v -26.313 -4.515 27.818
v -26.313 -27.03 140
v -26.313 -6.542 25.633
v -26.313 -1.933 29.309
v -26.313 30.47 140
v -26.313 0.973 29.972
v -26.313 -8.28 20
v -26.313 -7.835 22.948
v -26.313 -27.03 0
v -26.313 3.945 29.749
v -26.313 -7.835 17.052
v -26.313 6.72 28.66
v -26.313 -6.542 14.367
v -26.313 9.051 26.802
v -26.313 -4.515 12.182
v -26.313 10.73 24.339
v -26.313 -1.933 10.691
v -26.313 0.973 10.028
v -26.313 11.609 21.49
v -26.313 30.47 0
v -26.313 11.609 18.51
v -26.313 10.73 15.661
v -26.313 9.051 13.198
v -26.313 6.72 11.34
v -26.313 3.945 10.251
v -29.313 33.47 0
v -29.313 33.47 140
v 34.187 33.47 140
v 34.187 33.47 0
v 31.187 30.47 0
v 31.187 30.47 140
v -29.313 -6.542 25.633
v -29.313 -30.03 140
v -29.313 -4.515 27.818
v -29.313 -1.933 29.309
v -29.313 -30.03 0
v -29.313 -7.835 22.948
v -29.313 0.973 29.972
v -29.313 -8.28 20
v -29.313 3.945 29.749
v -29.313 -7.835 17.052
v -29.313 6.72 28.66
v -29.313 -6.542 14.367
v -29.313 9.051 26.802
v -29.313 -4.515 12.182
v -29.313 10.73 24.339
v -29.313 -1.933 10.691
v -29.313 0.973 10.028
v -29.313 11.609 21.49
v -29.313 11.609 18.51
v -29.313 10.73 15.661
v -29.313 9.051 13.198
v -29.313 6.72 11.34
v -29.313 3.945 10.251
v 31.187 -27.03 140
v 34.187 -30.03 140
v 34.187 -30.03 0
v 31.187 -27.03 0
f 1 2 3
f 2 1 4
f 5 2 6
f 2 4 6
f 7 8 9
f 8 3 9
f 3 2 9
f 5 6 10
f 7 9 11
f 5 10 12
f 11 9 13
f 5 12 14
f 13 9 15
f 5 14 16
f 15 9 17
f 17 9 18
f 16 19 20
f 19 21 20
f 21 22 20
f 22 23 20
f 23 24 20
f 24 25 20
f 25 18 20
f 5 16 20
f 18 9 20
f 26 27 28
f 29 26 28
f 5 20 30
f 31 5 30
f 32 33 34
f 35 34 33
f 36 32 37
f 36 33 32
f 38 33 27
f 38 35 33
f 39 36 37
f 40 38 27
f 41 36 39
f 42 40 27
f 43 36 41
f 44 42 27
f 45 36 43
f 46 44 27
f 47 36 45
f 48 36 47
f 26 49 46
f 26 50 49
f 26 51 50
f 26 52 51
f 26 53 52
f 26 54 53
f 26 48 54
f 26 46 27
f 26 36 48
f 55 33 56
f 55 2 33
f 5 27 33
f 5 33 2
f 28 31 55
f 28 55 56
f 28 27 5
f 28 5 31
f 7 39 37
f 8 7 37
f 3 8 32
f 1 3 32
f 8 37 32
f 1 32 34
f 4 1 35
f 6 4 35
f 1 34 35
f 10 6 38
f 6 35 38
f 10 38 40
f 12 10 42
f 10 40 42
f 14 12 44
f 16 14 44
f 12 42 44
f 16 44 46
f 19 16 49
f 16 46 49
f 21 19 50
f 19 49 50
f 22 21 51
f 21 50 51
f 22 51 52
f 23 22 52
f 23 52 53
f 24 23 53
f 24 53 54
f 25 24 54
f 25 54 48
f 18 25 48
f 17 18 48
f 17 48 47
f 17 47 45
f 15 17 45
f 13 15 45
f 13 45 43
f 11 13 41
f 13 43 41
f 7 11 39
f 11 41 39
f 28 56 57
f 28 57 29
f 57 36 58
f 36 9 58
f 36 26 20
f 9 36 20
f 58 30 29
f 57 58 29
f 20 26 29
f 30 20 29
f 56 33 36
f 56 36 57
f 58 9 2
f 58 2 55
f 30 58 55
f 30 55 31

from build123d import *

# Parameters (mm, degrees)
F0_W     = 63.5
F0_H     = 63.5
F0_W_2   = 57.5
F0_H_2   = 57.5
F1_DEPTH = 140
F2_R     = 10
F3_DEPTH = 3


# Not quite as in the source:
# - a feature names something its author has since deleted; it is built from what else it names


with BuildPart() as f1:
    # F0 (on Top) → F1 (new body)
    with BuildSketch(Plane.XY):
        with Locations((2.4368530139, 1.7202482249)):
            Rectangle(F0_W, F0_H)
        with Locations((2.4368530139, 1.7202482249)):
            Rectangle(F0_W_2, F0_H_2, mode=Mode.SUBTRACT)
    extrude(amount=F1_DEPTH)

    # F2 (on face) → F3 (cut)
    with BuildSketch(Plane(origin=(-29.3131469861, 0, 0), x_dir=(0, -1, 0), z_dir=(-1, 0, 0))):
        with Locations((-1.7202482249, 20)):
            Circle(F2_R)
    extrude(amount=-F3_DEPTH, mode=Mode.SUBTRACT)


solid = f1.part
